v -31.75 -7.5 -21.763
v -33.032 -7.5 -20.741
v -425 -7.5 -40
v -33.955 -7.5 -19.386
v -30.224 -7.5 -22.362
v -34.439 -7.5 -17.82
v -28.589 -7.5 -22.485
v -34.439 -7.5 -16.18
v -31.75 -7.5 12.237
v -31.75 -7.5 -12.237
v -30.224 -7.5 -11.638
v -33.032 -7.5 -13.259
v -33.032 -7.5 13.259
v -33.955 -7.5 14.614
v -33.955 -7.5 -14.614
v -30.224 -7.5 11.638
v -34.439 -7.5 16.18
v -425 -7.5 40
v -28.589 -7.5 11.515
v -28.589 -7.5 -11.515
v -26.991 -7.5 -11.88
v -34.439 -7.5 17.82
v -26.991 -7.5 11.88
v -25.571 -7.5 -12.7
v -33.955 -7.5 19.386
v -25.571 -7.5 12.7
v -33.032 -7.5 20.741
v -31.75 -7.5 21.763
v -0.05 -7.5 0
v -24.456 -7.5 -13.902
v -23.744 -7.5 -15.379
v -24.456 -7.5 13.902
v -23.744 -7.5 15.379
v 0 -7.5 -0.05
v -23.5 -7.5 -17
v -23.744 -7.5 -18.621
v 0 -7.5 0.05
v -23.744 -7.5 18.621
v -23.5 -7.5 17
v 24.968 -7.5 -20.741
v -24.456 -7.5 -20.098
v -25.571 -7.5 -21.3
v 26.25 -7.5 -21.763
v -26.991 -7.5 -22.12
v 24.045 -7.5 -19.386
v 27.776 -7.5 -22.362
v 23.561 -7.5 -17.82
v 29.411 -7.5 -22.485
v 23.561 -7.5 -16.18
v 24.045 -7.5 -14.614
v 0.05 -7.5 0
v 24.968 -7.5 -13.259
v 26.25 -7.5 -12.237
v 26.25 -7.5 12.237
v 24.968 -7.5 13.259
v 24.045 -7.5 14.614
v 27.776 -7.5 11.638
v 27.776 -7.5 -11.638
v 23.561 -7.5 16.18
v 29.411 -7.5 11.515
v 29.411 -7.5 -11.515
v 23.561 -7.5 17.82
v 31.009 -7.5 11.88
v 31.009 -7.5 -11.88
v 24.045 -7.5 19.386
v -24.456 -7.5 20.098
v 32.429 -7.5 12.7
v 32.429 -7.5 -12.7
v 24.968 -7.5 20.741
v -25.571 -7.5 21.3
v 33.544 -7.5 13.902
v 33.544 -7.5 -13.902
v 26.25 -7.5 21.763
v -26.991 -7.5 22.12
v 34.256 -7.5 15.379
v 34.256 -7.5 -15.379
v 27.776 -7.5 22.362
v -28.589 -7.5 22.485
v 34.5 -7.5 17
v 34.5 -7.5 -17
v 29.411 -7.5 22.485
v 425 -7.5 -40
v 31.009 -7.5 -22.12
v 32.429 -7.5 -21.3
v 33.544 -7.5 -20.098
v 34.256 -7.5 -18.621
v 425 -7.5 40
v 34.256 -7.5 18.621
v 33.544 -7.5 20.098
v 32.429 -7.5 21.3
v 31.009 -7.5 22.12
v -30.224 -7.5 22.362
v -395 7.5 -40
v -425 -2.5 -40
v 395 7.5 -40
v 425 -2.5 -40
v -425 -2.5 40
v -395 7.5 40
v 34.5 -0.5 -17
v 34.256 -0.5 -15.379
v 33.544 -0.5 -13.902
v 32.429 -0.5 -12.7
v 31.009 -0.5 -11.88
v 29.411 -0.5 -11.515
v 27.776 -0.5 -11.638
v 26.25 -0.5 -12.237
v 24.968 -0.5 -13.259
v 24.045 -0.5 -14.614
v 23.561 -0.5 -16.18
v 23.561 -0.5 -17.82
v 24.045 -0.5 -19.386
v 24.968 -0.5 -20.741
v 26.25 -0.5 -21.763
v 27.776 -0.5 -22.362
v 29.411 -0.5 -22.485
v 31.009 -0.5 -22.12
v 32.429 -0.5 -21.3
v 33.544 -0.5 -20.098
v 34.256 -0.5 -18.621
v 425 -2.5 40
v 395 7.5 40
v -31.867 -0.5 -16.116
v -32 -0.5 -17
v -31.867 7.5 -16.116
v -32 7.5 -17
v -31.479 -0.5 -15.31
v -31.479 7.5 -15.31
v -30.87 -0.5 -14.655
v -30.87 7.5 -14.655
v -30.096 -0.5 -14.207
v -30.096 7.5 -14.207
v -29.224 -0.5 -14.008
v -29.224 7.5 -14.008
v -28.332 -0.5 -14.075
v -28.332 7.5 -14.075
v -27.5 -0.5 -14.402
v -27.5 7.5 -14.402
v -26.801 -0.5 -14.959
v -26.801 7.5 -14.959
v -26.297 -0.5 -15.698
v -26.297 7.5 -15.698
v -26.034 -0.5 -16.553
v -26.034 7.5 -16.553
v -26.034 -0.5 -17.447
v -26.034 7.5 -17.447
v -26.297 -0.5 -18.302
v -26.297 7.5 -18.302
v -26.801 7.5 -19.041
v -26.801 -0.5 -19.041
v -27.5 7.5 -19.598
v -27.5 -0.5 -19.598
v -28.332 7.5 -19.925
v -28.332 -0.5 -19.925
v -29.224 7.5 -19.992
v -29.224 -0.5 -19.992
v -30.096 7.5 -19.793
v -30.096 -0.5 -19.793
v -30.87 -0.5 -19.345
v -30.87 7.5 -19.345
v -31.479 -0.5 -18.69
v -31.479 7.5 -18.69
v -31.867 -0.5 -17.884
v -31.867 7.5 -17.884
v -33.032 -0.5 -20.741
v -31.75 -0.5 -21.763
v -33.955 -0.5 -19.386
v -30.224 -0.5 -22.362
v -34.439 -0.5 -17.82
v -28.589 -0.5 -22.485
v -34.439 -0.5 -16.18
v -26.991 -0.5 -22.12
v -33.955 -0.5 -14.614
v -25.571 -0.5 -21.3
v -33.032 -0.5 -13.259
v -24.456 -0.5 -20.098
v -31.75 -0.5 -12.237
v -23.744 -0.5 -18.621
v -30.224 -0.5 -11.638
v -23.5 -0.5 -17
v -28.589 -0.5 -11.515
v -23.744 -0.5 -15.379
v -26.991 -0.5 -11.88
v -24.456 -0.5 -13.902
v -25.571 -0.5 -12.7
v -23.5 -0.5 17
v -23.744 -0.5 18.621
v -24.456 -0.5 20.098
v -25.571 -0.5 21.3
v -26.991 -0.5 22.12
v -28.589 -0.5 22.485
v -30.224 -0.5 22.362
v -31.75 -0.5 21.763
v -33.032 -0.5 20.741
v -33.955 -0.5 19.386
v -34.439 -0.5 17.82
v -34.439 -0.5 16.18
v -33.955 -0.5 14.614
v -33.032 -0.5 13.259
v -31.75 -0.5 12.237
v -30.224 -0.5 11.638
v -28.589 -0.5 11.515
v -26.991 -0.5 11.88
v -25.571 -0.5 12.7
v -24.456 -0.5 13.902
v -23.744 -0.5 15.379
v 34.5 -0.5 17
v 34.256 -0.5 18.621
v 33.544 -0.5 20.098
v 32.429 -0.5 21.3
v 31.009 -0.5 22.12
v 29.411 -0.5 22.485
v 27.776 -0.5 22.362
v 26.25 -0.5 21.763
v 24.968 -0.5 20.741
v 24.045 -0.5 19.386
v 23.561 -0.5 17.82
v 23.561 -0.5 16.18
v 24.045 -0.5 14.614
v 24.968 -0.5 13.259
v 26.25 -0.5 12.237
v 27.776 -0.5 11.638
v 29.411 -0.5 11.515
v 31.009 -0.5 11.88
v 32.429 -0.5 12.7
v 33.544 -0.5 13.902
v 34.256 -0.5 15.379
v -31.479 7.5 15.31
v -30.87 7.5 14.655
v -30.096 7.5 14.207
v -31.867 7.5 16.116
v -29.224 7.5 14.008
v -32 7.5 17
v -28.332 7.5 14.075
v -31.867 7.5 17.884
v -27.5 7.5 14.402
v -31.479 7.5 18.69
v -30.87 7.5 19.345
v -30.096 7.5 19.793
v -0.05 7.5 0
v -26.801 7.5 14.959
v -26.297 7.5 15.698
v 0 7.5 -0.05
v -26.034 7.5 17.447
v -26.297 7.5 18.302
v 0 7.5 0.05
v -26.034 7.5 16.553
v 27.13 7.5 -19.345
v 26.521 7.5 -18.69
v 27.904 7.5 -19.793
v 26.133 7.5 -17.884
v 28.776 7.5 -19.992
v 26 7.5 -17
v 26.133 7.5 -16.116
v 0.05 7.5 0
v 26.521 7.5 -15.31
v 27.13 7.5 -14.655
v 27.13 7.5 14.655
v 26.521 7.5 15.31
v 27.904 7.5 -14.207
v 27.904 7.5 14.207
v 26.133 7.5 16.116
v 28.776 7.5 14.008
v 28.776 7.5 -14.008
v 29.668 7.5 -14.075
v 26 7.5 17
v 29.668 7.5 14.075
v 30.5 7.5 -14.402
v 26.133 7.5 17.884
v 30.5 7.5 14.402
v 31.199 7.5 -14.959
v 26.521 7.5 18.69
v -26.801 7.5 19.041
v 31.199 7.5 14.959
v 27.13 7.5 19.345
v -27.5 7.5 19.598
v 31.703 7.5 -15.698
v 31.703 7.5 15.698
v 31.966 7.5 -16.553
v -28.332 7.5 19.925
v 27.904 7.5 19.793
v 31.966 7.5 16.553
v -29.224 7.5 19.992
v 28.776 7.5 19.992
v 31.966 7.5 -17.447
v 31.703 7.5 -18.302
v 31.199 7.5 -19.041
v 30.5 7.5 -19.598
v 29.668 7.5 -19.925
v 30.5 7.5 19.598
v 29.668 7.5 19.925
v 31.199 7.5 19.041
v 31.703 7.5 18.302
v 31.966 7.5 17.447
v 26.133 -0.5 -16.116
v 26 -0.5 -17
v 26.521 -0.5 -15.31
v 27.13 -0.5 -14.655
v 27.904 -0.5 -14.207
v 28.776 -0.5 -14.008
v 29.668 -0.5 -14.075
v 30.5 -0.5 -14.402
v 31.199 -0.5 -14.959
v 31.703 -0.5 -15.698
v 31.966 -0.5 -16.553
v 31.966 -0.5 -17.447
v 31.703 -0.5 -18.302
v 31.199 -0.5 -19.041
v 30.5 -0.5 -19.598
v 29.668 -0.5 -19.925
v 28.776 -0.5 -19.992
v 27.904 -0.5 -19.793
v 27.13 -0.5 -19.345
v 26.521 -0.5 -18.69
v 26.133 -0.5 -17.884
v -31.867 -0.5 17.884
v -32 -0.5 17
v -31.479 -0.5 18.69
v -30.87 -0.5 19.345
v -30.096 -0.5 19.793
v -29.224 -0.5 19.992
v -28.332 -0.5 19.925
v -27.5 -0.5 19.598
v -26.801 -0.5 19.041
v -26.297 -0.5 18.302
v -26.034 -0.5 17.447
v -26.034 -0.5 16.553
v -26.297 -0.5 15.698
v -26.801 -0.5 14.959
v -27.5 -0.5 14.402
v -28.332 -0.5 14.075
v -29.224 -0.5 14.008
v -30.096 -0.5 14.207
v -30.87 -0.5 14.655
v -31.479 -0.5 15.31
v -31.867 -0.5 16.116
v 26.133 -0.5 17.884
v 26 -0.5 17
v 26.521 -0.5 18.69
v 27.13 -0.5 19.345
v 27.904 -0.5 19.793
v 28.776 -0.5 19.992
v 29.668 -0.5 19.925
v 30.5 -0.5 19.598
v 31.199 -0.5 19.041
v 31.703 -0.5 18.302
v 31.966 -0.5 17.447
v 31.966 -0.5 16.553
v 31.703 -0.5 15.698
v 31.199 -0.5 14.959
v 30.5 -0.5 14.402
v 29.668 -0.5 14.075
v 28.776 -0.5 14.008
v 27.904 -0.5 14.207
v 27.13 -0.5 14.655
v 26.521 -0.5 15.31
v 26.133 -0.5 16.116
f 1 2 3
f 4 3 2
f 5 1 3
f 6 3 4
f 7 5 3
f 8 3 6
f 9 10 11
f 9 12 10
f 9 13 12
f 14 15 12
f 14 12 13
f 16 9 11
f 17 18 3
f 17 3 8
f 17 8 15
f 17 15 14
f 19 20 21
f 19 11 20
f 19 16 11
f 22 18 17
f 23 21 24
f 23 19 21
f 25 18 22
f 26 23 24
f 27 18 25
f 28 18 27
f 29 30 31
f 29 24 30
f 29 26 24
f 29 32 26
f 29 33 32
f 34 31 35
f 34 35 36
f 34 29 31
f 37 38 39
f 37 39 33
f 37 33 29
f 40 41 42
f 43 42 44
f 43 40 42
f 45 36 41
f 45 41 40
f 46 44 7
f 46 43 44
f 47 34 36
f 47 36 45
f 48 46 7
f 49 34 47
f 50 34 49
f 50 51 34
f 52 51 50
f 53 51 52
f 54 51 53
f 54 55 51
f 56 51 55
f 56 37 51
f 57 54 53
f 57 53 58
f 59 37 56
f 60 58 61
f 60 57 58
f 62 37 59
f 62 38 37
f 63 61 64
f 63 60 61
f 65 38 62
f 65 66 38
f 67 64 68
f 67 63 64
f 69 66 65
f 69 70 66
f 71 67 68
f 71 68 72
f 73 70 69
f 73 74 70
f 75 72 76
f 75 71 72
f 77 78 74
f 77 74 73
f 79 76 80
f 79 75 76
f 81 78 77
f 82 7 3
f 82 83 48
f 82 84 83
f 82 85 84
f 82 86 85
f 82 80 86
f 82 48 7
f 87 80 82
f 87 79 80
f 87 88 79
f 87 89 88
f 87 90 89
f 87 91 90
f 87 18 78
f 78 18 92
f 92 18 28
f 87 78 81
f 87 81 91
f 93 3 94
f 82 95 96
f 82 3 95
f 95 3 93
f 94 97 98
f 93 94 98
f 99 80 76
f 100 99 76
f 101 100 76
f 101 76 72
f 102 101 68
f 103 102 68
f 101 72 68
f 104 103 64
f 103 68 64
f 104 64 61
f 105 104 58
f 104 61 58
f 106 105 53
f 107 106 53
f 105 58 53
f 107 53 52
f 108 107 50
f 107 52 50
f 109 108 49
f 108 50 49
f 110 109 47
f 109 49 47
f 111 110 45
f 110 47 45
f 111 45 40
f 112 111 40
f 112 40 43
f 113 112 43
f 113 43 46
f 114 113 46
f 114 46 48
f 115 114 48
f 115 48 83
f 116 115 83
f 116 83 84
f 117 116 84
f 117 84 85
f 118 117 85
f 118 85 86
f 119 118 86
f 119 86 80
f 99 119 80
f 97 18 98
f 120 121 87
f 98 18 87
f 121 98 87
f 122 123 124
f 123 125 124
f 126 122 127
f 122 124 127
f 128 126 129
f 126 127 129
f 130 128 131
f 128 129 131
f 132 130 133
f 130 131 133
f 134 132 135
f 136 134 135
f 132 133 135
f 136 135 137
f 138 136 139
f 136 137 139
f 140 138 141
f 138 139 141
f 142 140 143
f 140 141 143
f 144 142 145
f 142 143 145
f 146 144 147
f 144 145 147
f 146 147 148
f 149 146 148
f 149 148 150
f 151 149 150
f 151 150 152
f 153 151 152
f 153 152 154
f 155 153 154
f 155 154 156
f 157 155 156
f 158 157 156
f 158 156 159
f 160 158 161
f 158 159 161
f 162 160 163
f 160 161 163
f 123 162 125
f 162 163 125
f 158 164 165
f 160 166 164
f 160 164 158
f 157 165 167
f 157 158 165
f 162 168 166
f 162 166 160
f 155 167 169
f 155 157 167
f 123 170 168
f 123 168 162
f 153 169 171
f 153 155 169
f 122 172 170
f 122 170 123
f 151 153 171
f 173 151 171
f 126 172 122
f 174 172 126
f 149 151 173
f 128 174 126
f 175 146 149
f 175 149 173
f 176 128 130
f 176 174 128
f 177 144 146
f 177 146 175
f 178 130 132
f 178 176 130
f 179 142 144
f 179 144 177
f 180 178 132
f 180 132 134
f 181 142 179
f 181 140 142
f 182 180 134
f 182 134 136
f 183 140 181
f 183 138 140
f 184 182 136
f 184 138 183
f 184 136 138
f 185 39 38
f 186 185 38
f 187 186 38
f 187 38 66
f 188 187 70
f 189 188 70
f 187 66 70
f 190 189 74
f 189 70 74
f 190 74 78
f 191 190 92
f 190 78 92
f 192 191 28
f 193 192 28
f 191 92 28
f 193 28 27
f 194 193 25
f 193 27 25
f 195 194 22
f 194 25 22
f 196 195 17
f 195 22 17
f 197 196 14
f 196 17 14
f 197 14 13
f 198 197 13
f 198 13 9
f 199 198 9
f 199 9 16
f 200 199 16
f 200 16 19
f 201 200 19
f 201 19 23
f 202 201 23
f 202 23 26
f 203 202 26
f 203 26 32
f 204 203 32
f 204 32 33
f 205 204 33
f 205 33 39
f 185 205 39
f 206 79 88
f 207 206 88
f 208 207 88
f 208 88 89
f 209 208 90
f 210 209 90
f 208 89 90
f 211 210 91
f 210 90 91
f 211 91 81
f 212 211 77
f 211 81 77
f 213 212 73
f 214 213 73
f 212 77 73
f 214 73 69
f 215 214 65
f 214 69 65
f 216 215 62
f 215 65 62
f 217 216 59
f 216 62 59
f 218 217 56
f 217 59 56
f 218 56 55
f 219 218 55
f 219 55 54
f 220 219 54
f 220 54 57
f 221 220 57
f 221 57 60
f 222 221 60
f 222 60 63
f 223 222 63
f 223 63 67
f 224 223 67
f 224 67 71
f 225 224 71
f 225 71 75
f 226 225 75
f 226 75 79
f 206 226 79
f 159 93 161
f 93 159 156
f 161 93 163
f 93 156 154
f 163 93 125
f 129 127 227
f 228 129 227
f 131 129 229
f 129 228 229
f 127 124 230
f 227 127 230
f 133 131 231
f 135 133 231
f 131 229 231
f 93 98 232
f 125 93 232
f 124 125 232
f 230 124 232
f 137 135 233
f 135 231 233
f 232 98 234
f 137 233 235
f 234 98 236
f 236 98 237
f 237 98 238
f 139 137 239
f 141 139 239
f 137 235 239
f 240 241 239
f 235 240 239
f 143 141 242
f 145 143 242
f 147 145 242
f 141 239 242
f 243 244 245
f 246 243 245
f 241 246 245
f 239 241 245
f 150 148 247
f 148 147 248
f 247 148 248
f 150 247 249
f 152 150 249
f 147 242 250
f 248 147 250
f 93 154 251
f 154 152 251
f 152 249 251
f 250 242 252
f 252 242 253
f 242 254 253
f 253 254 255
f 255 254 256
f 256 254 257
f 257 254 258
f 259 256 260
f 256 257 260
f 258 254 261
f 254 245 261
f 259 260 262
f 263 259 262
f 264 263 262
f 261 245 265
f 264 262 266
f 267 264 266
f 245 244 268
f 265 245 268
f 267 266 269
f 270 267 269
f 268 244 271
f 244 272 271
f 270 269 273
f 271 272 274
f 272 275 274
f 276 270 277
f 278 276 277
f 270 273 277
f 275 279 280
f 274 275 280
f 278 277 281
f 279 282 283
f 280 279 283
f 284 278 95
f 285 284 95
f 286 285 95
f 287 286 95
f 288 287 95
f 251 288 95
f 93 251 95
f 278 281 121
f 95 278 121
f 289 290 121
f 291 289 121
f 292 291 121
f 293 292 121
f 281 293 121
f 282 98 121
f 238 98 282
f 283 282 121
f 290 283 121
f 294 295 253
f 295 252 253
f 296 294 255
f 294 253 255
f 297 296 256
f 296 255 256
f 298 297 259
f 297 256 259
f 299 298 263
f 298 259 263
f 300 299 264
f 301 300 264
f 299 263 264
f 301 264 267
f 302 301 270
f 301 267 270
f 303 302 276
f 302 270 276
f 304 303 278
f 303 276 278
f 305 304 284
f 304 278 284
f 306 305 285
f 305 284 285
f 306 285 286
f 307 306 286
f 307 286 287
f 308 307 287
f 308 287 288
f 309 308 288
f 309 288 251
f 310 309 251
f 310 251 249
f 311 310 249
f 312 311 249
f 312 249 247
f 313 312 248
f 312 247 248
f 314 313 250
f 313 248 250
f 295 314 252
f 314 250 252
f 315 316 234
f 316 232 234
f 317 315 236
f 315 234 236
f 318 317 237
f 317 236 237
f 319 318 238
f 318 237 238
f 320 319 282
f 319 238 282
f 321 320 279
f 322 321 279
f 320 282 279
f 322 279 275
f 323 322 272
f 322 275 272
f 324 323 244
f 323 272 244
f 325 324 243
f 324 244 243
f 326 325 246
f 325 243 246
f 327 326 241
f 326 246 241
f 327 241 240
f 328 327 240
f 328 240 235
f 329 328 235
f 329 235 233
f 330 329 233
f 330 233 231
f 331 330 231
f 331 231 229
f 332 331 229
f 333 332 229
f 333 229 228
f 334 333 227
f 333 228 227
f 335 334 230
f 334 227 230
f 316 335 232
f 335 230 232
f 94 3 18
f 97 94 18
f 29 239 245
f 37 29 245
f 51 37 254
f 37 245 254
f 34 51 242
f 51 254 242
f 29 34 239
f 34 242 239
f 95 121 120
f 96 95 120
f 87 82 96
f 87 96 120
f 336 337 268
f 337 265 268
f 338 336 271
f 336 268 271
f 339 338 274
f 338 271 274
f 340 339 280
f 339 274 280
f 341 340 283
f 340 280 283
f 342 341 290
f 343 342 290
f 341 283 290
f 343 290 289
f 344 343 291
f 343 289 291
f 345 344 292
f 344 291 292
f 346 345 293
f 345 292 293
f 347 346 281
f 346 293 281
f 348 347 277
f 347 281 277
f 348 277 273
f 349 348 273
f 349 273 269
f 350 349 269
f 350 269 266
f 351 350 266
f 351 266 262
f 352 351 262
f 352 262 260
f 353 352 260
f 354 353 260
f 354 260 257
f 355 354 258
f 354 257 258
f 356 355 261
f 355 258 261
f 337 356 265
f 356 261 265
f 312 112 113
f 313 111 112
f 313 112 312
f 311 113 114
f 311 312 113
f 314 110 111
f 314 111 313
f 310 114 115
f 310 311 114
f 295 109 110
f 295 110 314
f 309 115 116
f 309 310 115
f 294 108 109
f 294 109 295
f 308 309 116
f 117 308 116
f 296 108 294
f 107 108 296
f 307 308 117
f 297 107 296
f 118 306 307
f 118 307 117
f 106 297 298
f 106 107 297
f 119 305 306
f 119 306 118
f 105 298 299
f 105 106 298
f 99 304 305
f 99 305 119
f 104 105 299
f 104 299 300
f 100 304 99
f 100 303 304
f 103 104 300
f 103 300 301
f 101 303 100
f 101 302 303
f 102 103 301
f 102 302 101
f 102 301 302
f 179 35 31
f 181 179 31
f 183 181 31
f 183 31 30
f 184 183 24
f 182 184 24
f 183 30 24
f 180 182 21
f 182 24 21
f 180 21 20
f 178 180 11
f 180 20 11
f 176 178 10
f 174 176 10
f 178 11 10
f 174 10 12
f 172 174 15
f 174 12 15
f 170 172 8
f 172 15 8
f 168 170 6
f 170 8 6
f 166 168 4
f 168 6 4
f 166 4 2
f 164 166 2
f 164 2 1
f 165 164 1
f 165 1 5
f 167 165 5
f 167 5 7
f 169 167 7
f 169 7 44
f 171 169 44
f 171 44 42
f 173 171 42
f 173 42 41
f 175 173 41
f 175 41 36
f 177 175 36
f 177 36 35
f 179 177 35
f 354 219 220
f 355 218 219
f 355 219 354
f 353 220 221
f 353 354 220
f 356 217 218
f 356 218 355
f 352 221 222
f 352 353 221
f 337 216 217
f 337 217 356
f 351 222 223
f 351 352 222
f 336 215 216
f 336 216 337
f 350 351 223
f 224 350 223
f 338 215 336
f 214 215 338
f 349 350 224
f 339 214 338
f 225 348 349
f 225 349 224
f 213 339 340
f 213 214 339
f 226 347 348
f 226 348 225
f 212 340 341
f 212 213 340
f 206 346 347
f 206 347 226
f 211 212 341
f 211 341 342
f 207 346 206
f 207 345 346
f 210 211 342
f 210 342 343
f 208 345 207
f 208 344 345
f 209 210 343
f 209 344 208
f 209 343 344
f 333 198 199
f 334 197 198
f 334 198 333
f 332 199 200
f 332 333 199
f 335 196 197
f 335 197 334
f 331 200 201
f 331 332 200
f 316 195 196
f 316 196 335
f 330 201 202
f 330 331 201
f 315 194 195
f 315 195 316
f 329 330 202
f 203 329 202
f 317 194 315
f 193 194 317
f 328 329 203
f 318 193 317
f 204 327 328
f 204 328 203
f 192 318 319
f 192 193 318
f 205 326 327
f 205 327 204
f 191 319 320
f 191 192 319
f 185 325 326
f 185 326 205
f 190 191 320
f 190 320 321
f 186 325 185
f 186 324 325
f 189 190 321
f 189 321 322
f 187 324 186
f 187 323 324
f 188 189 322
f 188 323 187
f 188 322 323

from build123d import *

# Parameters (mm, degrees)
F0_W           = 850
F0_H           = 80
F1_DEPTH       = 7.5
F3_D           = 6
F3_CBORE_D     = 11
F3_CBORE_DEPTH = 7
F4_D           = 0.1
F6_DEPTH       = 80.001


with BuildPart() as f1:
    # F0 (on Front) → F1 (new body, symmetric)
    with BuildSketch(Plane.XZ):
        Rectangle(F0_W, F0_H)
    extrude(amount=F1_DEPTH, both=True)

    # F3 (through all)
    with Locations(Plane.XZ.offset(7.5)):
        with Locations((-29, 17), (29, 17), (29, -17), (-29, -17)):
            CounterBoreHole(F3_D / 2, F3_CBORE_D / 2, F3_CBORE_DEPTH)

    # F4 (through all)
    with Locations(Plane.XZ.offset(7.5)):
        with Locations((0, 0)):
            Hole(F4_D / 2)

    # F5 (on face) → F6 (cut, through all)
    with BuildSketch(Plane.XY.offset(40)):
        Polygon((-395, 7.5), (-425, 7.5), (-425, -2.5), align=None)
        Polygon((425, 7.5), (395, 7.5), (425, -2.5), align=None)
    extrude(amount=-F6_DEPTH, mode=Mode.SUBTRACT)


solid = f1.part
